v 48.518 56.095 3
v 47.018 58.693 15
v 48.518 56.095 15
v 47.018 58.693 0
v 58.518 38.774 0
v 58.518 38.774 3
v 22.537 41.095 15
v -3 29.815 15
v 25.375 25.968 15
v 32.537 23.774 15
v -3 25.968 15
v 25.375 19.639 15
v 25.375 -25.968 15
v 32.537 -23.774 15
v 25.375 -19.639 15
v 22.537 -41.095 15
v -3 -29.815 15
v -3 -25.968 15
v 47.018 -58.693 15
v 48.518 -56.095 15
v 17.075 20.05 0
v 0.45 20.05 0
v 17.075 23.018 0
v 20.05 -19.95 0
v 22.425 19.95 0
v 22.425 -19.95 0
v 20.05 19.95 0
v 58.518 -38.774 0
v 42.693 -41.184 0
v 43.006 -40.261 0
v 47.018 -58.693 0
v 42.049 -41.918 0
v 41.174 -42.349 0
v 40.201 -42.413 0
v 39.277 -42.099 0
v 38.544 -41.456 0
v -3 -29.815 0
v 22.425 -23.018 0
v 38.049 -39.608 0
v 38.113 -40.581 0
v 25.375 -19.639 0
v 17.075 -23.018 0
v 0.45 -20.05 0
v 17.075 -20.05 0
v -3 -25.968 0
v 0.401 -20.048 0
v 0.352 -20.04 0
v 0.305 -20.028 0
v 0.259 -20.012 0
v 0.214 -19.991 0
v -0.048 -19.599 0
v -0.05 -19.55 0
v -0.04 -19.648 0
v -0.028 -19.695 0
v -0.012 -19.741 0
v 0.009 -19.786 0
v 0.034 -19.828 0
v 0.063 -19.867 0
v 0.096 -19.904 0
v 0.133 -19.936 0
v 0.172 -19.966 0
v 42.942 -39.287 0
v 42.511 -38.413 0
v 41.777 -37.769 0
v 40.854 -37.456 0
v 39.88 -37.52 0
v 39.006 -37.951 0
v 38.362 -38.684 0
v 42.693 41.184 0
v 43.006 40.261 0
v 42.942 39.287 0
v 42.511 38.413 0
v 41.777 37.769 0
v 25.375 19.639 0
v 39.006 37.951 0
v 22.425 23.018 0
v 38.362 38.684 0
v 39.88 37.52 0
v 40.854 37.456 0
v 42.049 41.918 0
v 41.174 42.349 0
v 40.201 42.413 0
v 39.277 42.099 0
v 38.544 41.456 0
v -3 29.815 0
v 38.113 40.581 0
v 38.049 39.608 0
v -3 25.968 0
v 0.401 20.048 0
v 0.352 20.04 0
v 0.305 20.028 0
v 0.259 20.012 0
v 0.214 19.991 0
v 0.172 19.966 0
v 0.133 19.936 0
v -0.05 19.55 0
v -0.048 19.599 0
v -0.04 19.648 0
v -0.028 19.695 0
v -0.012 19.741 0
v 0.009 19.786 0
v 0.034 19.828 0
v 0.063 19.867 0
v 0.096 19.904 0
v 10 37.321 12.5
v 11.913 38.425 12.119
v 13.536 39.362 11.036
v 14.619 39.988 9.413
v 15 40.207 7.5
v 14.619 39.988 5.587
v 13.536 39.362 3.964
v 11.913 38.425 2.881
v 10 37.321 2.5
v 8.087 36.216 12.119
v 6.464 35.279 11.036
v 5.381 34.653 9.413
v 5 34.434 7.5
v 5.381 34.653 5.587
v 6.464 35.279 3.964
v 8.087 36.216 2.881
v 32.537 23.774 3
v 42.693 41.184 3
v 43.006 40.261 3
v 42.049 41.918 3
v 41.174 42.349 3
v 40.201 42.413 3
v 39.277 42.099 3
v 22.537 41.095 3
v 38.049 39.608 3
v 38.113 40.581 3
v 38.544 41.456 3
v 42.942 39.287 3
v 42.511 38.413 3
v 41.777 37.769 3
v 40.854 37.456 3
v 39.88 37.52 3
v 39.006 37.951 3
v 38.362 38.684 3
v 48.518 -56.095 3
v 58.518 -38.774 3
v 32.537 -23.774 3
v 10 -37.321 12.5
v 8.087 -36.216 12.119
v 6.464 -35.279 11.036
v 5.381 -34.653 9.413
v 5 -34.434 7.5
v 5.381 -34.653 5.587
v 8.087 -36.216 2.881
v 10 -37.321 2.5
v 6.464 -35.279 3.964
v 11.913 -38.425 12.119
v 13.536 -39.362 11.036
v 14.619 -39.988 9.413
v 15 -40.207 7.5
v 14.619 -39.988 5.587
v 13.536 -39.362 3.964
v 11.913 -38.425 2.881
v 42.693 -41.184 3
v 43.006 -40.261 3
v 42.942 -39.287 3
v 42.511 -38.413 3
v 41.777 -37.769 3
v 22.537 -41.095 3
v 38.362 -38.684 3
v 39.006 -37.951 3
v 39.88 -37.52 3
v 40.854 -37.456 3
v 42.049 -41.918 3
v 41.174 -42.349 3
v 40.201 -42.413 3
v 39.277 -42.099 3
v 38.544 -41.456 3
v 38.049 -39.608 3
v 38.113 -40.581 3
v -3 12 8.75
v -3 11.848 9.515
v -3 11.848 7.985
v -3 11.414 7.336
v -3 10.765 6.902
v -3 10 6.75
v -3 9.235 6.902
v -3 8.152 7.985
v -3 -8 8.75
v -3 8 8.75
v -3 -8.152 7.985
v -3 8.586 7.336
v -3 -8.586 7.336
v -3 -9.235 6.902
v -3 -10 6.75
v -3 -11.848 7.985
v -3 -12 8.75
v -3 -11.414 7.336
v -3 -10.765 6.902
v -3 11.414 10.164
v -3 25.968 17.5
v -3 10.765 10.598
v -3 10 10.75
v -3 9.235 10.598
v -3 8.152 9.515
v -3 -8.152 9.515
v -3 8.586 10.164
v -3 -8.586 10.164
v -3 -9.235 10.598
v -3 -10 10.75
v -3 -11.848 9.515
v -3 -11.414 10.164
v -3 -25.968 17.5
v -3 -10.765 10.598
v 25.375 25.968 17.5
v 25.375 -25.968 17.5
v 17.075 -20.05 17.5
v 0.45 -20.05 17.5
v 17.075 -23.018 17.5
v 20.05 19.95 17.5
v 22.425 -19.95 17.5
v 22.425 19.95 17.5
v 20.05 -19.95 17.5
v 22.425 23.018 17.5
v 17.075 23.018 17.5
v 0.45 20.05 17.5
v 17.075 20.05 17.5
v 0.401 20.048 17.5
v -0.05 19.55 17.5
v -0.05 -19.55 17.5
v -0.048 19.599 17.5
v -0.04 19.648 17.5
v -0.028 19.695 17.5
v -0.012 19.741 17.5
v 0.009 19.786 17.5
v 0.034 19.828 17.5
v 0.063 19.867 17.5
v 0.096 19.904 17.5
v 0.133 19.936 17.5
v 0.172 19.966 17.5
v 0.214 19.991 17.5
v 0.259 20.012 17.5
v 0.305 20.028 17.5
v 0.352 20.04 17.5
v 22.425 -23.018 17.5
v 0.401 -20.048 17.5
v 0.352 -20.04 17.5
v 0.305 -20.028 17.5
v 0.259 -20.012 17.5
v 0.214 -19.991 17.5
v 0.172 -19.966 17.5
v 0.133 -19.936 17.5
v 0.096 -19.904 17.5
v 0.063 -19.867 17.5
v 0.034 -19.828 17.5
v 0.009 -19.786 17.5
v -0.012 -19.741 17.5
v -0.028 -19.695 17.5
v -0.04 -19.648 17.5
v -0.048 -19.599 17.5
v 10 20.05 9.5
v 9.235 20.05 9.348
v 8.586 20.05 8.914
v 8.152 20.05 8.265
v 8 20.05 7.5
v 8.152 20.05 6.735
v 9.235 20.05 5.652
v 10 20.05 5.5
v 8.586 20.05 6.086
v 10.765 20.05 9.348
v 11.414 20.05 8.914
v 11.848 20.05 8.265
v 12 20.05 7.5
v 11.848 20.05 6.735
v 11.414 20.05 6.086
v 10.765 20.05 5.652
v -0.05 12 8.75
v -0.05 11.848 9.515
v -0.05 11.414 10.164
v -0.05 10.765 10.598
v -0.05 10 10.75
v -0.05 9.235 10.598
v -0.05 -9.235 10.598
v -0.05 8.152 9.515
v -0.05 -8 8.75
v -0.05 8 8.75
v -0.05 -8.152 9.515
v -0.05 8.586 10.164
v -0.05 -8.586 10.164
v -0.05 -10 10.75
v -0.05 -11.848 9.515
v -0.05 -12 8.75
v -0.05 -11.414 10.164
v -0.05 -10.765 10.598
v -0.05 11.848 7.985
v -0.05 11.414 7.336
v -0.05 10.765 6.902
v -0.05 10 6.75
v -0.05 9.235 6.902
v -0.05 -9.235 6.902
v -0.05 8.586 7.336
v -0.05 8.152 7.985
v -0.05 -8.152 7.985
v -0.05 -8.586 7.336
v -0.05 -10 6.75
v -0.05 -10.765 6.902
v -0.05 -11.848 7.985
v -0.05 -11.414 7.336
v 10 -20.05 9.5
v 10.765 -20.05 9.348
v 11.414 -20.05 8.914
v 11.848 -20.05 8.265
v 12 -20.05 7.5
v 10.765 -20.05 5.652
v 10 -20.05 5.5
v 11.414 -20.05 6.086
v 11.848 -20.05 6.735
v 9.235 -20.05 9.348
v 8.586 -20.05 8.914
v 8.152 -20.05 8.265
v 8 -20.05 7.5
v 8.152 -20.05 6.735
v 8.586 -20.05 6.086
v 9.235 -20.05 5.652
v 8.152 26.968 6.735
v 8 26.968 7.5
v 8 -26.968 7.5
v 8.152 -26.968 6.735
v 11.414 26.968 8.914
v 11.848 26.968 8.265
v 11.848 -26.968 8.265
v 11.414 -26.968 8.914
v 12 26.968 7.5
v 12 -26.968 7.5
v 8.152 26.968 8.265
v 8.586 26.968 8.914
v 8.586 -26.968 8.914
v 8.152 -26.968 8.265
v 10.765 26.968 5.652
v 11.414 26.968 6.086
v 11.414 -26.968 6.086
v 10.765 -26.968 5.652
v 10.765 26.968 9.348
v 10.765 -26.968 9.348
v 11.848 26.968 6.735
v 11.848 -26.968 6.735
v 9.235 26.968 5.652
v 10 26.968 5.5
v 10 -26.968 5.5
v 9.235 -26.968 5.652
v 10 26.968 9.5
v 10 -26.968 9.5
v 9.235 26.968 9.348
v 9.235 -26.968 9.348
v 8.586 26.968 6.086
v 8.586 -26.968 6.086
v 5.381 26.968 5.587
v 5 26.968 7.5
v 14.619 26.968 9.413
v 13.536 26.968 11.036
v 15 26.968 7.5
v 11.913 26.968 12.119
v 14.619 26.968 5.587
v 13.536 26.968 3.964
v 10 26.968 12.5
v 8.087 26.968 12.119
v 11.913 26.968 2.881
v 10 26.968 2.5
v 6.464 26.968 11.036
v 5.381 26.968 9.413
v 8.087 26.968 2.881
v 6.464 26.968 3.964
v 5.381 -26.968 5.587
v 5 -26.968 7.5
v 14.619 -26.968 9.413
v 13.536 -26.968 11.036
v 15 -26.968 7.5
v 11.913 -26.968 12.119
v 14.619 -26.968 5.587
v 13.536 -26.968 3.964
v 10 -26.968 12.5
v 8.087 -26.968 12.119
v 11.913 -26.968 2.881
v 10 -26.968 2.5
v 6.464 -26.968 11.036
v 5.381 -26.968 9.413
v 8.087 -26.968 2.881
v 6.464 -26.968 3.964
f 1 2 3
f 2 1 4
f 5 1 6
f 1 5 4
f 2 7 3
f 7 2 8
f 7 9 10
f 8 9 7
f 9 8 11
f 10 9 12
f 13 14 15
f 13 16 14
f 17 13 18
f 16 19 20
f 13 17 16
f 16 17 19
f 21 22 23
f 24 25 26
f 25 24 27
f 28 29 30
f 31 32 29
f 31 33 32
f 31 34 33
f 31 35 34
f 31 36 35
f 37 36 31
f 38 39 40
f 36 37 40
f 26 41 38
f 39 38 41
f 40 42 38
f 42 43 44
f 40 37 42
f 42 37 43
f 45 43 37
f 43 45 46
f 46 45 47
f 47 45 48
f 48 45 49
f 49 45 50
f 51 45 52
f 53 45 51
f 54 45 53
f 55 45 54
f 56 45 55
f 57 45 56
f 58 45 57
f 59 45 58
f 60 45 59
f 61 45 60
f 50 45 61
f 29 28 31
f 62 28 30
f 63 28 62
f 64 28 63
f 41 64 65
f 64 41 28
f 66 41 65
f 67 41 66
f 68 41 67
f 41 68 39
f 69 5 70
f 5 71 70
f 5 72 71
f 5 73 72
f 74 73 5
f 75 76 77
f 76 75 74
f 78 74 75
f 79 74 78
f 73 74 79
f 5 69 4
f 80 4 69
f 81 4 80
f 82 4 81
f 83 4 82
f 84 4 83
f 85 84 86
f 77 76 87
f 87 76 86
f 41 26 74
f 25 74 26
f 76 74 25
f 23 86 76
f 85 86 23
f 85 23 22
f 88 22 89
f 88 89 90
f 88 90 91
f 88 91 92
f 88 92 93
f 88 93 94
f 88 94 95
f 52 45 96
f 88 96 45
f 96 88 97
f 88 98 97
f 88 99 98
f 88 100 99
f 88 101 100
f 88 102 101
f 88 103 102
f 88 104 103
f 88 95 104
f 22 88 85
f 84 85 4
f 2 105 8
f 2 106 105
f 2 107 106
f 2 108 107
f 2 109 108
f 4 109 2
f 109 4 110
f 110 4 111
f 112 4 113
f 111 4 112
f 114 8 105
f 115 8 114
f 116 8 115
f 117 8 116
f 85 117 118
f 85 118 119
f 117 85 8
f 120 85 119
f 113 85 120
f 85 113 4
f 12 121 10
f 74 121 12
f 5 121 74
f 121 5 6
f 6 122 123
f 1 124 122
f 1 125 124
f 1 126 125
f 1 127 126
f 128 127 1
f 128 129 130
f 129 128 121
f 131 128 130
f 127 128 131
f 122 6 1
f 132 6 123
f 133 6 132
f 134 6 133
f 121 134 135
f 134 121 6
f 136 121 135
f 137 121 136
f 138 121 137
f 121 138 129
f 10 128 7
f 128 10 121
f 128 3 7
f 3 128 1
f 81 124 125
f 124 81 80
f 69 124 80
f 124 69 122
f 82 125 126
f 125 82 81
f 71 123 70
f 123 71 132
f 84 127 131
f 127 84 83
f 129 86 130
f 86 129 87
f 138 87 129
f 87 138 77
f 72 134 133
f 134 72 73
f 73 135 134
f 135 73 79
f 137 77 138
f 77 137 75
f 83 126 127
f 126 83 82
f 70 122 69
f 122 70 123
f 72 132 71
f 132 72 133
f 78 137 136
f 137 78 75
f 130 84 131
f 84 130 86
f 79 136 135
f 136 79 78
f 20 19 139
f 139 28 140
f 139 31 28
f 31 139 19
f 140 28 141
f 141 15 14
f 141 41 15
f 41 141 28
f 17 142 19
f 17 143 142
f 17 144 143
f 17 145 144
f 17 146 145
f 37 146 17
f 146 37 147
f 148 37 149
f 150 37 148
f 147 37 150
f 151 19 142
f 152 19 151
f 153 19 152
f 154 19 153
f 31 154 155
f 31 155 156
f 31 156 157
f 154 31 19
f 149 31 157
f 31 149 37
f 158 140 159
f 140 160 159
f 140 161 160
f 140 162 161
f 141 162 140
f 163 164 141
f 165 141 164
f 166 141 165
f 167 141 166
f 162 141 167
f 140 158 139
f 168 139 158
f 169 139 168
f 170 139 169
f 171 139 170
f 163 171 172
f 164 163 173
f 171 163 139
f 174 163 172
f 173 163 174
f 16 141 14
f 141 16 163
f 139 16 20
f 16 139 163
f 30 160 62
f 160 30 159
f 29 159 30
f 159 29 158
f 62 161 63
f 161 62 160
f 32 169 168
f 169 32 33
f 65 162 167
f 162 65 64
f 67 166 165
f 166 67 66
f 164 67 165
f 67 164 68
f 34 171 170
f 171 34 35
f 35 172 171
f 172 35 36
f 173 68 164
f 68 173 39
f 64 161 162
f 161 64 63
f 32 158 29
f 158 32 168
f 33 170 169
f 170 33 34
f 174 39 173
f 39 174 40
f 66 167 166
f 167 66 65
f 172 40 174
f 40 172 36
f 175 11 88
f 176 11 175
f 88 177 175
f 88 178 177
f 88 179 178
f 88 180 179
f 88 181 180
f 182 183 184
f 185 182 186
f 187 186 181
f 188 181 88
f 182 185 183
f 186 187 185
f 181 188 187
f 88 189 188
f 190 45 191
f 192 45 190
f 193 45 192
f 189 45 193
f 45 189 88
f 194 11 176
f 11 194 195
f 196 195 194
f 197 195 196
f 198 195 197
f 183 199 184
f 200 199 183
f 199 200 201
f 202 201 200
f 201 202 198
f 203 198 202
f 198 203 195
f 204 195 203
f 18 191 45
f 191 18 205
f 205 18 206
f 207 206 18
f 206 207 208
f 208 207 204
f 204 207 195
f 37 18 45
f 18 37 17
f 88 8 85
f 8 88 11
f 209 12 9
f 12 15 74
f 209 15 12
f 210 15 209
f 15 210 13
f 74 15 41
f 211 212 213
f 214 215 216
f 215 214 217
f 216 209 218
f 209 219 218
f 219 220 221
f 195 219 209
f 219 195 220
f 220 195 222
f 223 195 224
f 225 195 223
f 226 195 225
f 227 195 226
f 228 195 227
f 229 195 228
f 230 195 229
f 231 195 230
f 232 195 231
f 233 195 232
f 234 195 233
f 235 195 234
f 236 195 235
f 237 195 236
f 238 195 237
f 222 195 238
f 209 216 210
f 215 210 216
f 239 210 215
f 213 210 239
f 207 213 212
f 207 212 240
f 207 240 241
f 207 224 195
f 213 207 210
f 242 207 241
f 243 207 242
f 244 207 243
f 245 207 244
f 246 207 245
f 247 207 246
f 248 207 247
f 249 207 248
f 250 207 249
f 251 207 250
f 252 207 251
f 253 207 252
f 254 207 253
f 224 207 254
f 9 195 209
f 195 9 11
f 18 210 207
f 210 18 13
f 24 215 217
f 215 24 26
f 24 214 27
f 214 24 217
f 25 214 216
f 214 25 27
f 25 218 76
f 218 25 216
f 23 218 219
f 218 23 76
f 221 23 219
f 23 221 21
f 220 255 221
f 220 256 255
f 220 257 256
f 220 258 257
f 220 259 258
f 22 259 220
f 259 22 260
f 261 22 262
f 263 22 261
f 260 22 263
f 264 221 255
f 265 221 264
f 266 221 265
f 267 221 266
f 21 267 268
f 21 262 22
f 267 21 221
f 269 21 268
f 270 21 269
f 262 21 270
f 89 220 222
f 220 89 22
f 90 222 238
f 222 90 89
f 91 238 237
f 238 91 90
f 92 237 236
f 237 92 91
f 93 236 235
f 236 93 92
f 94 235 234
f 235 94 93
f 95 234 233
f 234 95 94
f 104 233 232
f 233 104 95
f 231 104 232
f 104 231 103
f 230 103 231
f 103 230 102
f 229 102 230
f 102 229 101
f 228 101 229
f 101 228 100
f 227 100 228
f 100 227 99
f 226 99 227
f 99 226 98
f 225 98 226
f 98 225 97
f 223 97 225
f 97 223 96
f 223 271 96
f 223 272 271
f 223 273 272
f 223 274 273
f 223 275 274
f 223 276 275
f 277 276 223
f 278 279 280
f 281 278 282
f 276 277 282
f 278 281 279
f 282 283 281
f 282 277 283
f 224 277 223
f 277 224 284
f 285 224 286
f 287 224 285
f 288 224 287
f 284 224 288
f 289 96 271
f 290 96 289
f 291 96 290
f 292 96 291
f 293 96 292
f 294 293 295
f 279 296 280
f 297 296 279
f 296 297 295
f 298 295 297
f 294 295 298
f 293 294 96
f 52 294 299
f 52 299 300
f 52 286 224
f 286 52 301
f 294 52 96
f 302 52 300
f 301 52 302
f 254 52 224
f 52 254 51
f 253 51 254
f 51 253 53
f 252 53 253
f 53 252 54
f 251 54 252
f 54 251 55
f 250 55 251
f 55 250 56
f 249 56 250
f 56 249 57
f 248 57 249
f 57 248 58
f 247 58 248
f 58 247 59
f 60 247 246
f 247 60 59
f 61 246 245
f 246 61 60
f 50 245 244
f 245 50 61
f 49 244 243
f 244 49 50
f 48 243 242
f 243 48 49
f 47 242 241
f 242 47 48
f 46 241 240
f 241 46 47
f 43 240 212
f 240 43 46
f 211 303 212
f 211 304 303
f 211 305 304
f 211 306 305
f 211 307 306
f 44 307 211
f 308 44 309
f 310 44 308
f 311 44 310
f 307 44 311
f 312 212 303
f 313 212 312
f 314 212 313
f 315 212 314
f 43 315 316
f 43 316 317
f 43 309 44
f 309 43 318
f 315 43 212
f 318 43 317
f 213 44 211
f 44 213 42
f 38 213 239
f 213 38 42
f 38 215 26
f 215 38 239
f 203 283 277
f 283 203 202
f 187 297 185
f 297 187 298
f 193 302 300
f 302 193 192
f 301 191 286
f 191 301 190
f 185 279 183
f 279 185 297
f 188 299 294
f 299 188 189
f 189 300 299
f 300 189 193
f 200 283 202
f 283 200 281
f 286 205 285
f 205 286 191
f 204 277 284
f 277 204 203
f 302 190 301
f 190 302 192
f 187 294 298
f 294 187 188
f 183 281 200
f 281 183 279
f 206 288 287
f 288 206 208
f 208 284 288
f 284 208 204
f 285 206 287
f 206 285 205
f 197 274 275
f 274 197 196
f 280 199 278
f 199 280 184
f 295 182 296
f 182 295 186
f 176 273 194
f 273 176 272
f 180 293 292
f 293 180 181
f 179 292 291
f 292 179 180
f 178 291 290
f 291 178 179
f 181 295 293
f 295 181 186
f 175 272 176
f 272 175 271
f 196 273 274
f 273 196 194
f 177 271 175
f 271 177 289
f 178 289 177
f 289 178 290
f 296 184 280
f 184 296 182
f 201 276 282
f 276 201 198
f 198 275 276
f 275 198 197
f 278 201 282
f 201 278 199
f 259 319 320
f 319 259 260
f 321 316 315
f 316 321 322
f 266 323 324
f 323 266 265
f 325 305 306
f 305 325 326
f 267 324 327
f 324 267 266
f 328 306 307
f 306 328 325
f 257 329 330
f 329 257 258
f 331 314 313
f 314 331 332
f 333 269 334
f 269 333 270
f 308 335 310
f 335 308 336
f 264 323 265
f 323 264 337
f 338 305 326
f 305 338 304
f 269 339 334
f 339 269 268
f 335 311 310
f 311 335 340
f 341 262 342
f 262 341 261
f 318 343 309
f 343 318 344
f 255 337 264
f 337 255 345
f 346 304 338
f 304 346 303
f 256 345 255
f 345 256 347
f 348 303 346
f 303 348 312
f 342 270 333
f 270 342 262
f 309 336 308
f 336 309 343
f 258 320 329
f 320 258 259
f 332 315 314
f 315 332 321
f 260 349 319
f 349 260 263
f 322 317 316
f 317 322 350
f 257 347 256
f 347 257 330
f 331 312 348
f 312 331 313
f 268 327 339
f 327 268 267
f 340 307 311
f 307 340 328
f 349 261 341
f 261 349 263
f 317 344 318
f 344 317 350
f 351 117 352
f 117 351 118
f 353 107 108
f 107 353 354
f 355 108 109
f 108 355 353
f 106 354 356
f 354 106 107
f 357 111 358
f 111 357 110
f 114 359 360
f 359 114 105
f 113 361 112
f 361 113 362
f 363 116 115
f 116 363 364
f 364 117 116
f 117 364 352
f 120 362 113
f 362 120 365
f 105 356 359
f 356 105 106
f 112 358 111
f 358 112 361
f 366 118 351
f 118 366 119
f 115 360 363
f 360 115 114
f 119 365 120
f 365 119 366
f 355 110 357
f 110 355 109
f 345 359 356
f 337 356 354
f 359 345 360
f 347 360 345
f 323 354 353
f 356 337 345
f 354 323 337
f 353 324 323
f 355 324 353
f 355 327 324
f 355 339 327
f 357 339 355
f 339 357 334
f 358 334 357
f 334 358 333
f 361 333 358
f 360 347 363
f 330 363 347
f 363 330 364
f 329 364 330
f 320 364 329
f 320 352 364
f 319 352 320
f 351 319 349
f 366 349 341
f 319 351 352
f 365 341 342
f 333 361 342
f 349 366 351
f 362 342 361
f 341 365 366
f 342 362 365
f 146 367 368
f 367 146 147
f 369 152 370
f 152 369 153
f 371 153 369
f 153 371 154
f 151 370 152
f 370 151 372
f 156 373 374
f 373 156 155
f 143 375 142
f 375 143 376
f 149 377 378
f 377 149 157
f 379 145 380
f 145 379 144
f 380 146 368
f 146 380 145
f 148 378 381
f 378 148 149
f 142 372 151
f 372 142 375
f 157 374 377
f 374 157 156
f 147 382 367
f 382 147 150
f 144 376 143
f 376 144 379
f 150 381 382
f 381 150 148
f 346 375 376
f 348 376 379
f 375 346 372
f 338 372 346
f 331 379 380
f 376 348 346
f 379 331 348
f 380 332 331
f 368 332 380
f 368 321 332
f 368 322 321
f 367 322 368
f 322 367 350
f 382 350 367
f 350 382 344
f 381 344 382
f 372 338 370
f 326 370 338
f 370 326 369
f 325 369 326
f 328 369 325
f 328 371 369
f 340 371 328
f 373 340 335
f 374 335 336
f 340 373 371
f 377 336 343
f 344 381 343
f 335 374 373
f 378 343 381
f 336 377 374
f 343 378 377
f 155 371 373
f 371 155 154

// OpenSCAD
// file: ../../conf/printer_config.scad
/**********************************************************************************************************************
 **
 ** conf/printer_config.scad
 **
 ** This file contains the main control variables that determine the size and shape of the printer. Note that in the
 ** actual parts specifications, the constants defined here will only ever be accessed through functions defined in
 ** conf/derived_sizes.scad exclusively to allow for easier adaptation, should the mode of calculation change. 
 **
 ** All sizes in mm. Caution: Little to no cross-checking is implemented. Change values sensibly and one at a time.
 **
 ** This file is NOT to be included by any other file except for conf/derived_sizes.scad.
 **
 **********************************************************************************************************************/

include <constants.scad>

// ===== PRINTER CONFIGURATION ========================================================================================

// The length of the vertical MakerSlide extrusions that make up the rails for the carriages.
FRAME_V_RAIL_HEIGHT = 800;

// The length of the horizontal 20x20 V-Slot extrusions that form the sides of the triangle.
FRAME_H_RAIL_LENGTH = 400;

// ===== FABRICATED PART DIMENSIONS ===================================================================================

// The additional clearance to leave around the MakerSlide extrusion.
MAKERSLIDE_CLEARANCE = 0.05;

// The thickness of the walls outside the extruded parts.
FRAME_PART_WALL_THICKNESS = 3;

// The thickness of the wall that separates the vertical rails from the horizontal extrusions.
FRAME_V_H_RAIL_SEPARATION = 8;

// The depth of the holes that hold the V-Slot extrusions.
FRAME_PART_VSLOT_DEPTH = 30;

// Whether to use a horizontal rail at the base of the printer or not.
FRAME_HORIZONTAL_BASE_RAIL = false;

// The depth of the holes in the foot that hold the MakerSlide extrusions. This is for the foot version that holds
// a horizontal rail.
FRAME_FOOT_RAIL_MAKERSLIDE_DEPTH = 25; 

// The depth of the holes in the foot that hold the MakerSlide extrusions. This is for the foot version that does not
// hold a horizontal rail.
FRAME_FOOT_NORAIL_MAKERSLIDE_DEPTH = 17.5; 

// The size of the screws that can be used to mount the foot to the underlying surface.
FRAME_FOOT_BOTTOM_SCREW_SIZE = M5;

// The height of the bracket that holds the motor. WARNING: Increasing this might make it difficult to 
// turn the screws that hold the motor.
FRAME_MOTOR_BRACKET_HEIGHT = 25;

// The height of the bracket that holds the intermediate level with the working surface (print bed).
FRAME_BED_BRACKET_HEIGHT = 25; 

// The depth of the holes in the head that hold the MakerSlide extrusions.
FRAME_HEAD_MAKERSLIDE_DEPTH = 35; 

// The thickness of the carriage base plate. A thicker plate will make the carriage stiffer, but cost more
// material to print and take away space from the working area.
CARRIAGE_PLATE_THICKNESS = 6;

// The width of the border around the holes in the carriage base plate that hold the V-Wheels. 
CARRIAGE_PLATE_BORDER_WIDTH = 8;

// The range by which the vertical belt tensioner can be adjusted.
TENSIONER_RANGE = 15;

// The distance between the rods that hold the effector.
ROD_DISTANCE = 65;

// The outer diameter of the rods.
ROD_OUTER_DIAMETER = 6;

// The inner diameter of the rods. Set to 0 if the rods are not hollow.
ROD_INNER_DIAMETER = 4;

// The additional clearance to leave between the rod and the holder.
ROD_CLEARANCE = 0.05;

// The thickness of the outer wall around the rod.
ROD_HOLDER_WALL_THICKNESS = 2;

// The depth of the insets that hold the rods.
ROD_HOLDER_DEPTH = 10;

// The minimum angle of the arms.
ROD_MIN_ANGLE = 20;

// The factor used to round up the rod length.
ROD_ROUND_UP_TO = 5;

// The thickness of the magnet holder arms.
MAGNET_HOLDER_THICKNESS = 5;

// The additional clearance to leave around the magnet holder pin.
MAGNET_CLEARANCE = 0.025;

// The upward angle of the ball holder on the carriage.
CARRIAGE_BALL_HOLDER_ANGLE = 10;

// The additional distance between the magnets on the effector (not the rod distance - the other one :-)).
// This value is added to the minimum distance determined by the magnet size and wall thickness.
EFFECTOR_BALL_ADDITIONAL_DISTANCE = 15;

// The thickness of the effector plate.
EFFECTOR_THICKNESS = 8;
// file: ../../conf/constants.scad
/**********************************************************************************************************************
 **
 ** conf/constants.scad
 **
 ** This file contains constants and aliases used for the part size definitions.
 **
 **********************************************************************************************************************/

/**
 * The alias names for the rails.
 * A is the "front left" rail, B the "front right" rail, C the back rail.
 * These constants are also used for the sides of the frame and the effector; in this case, side A is the one 
 * opposing rail A.
 */
A = 0;
B = 1;
C = 2;

/**
 * Aliases for metric screw/nut sizes.
 */
M2 = 2;
M3 = 3;
M4 = 4;
M5 = 5;

/** 
 * Aliases for NEMA stepper motors.
 */
NEMA14 = 14;
NEMA17 = 17;
NEMA23 = 23;
// file: ../extrusions/vslot_2020.scad
/**********************************************************************************************************************
 **
 ** parts/extrusions/vslot_2020.scad
 **
 ** This file ontains some general functions that provide the dimensions of the profile as well as the modules used 
 ** to import the rendered rails. 
 ** This file is intended to be included by other files down the line.
 **
 **********************************************************************************************************************/

include <../../conf/colors.scad>
include <../../conf/derived_sizes.scad>
include <../../conf/part_sizes.scad>

use <../../bom/bom.scad>

/**
 * Provides the pre-rendered horizontal side piece.
 * The extrusion will lie horizontally along the positive X axis and will extend into positve Y and Z.
 */
module vslot_2020_side() {
	bom_entry(section = "Aluminium Extrusions", description = "V-Slot Extrusion", size = str(horizontal_extrusion_length(), "x20x20 mm"));
	color_extrusion()
		import(file = "vslot_2020_side.stl"); 
}

/**
 * Create an object that resembles the outer shell of a V-Slot 20x20 mm extrusion. Usage is similar
 * to vslot_extrusion(length). This is handy to punch a hole into a printed part that will later
 * accomodate the V-Slot 20x20 mm extrusion.
 */
module vslot_2020_punch(length, rounded = false) {
	color_punch()
		linear_extrude(height = length, center = false, convexity = 10)
			if (rounded) {
				hull($fn = vslot_2020_edge_resolution()) {
					translate([vslot_2020_edge_radius(), vslot_2020_edge_radius(), 0])
						circle(r = vslot_2020_edge_radius());
					translate([vslot_2020_depth() - vslot_2020_edge_radius(), vslot_2020_edge_radius(), 0])
						circle(r = vslot_2020_edge_radius());
					translate([vslot_2020_edge_radius(), 18.5, 0])
						circle(r = vslot_2020_edge_radius());
					translate([vslot_2020_depth() - vslot_2020_edge_radius(), vslot_2020_width() - vslot_2020_edge_radius(), 0])
						circle(r = vslot_2020_edge_radius());
				}
			} else {
				square([vslot_2020_depth(), vslot_2020_width()]);
			}
}
// file: ../extrusions/makerslide.scad
/**********************************************************************************************************************
 **
 ** parts/extrusions/makerslide.scad
 **
 ** This file ontains some general functions that provide the dimensions of the profile as well as the modules used 
 ** to import the rendered rails. 
 ** This file is intended to be included by other files down the line.
 **
 **********************************************************************************************************************/

include <../../conf/colors.scad>
include <../../conf/derived_sizes.scad>
include <../../conf/part_sizes.scad>

use <../../bom/bom.scad>

/**
 * Provides the pre-rendered main vertical rail.
 * The extrusion will reach into positive X and Z space while being centered on the Y axis.
 */
module makerslide_vertical_rail() {
	bom_entry(section = "Aluminium Extrusions", 
		      description = "MakerSlide Extrusion", 
		      size = str(vertical_extrusion_length(), " mm"));
	color_extrusion()
		import(file = "makerslide_rail.stl"); 
}

/**
 * Create an object that resembles the outer shell of a MakerSlide extrusion. Usage is similar
 * to makerslide_vertical_rail(length). This is handy to punch a hole into a printed part that will later
 * accomodate the MakerSlide extrusion.
 */
module makerslide_punch(length) {
	color_punch()
		linear_extrude(height = length, center = false, convexity = 10)
			union() {
				hull() {
					// use two circles for the back sides
					_y_offset = makerslide_base_width()/2 - makerslide_edge_radius() + makerslide_clearance();
					translate([makerslide_edge_radius() - makerslide_clearance(), -_y_offset, 0])
						circle(r = makerslide_edge_radius(), $fn = makerslide_edge_resolution());
					translate([makerslide_edge_radius() - makerslide_clearance(), _y_offset, 0])
						circle(r = makerslide_edge_radius(), $fn = makerslide_edge_resolution());
					// use a rectangle to shape the front side
					translate([makerslide_base_depth() - 1 + makerslide_clearance(), 
						       -makerslide_base_width()/2 - makerslide_clearance(), 0])
						square([1, makerslide_base_width() + 2 * makerslide_clearance()]);
				}
				_rail_base_x = makerslide_base_depth() - makerslide_edge_radius() - 
				               makerslide_rail_depth() - makerslide_clearance();
				_rail_offset_y = makerslide_base_width()/2 - makerslide_clearance();
				_rail_punch_width = makerslide_rail_width() + 2 * makerslide_clearance();
				_rail_punch_depth = 2*makerslide_rail_depth() + makerslide_edge_radius() + 2 * makerslide_clearance();
				translate([_rail_base_x, -_rail_offset_y - _rail_punch_width, 0])
					square([_rail_punch_depth, _rail_punch_width]);
				translate([_rail_base_x, _rail_offset_y, 0])
					square([_rail_punch_depth, _rail_punch_width]);

				// previous version:
				// // use the profile itself as the basic shape
				// import(file = "makerslide.dxf"); 
				// // add a rectangle to fill the holes on the left/right (small) sides 
				// // as well as most of the inside of the profile
				// translate([2, -20, 0])
				// 	square([18, 40]);
				// // add a second rectangle to fill the gaps on the back (we want to keep the rounded edges)
				// translate([0, -18, 0])
				// 	square([2, 36]);
				
			}
}
// file: ../../bom/bom.scad
/**********************************************************************************************************************
 **
 ** bom/bom.scad
 **
 ** This file provides the functions to generate a basic bill of materials (BOM) from the model.
 **
 **********************************************************************************************************************/

/**
 * A recursive function to format the parent module hierarchy as a series of delimited sub-strings.
 * Example: "vertical_axis_assembly>_vertical_axis_assembly>makerslide_vertical_rail"
 */
function _bom_parent_list(level, delimiter = ">") = 
	(level < $parent_modules - 1) ? str(_bom_parent_list(level = level + 1), delimiter, parent_module(level)) : "";

module bom_entry(section = "", description = "", size = "", number = 1) {
	// Only perform any actions if WRITE_BOM is set. This is done through the command line - see Makefile.
	if (WRITE_BOM) {
		echo(str("BOM;", section, ";", description, ";", size, ";", number, ";", _bom_parent_list(level = 2)));
	}
}
// file: ../../conf/colors.scad
/**********************************************************************************************************************
 **
 ** conf/colors.scad
 **
 ** This file defines some modules to use symbolic colors throughout the entire project.
 **
 **********************************************************************************************************************/

/**
 * The color of the aluminium extrusions.
 */
module color_extrusion() {
	color("LightGrey")
		children();
} 

/**
 * The color of the "outer" printed frame elements.
 */
module color_printed_outer_frame() {
	color("RoyalBlue")
		children();
} 

/**
 * The color of the "inner" printed frame elements.
 */
module color_printed_inner_frame() {
	color("DodgerBlue")
		children();
} 

/**
 * The color of the printed carriages.
 */
module color_printed_carriage() {
	color("DodgerBlue")
		children();
} 

/**
 * The color of the printed tensioners and end switch brackets.
 */
module color_printed_head_parts() {
	color("PowderBlue")
		children();
} 

/**
 * The color of the magnet holders.
 */
module color_printed_magnet_holders() {
	color("RoyalBlue")
		children();
} 

/**
 * The color of the printed effectors.
 */
module color_printed_effector() {
	color("DodgerBlue")
		children();
} 

/**
 * The color of the stock hardware parts like nuts, bolts and screws.
 */
module color_hardware() {
	color("DarkSlateGray")
		children();
} 

/**
 * The color of the magnets and steel balls.
 */
module color_magnets_balls() {
	color("Silver")
		children();
} 

/**
 * The color of the gears and ball bearings.
 */
module color_gears() {
	color("Gray")
		children();
} 

/**
 * The color of the belts.
 */
module color_belt() {
	color("SaddleBrown")
		children();
} 

/**
 * The color of the stepper motors.
 */
module color_motor() {
	color("DimGray")
		children();
} 

/**
 * The color of the end switches.
 */
module color_switch() {
	color([0.15, 0.15, 0.15])
		children();
} 

/**
 * The color of the V-Wheels.
 */
module color_vwheels() {
	color([0.075, 0.075, 0.075])
		children();
} 

/**
 * The color of the carbon fiber rods for the arms.
 */
module color_rod() {
	color([0.2, 0.2, 0.2])
		children();
} 

/**
 * The color of punches and other objects that are usually not intended to be rendered as such, but rather to be
 * used as subtractive objects.
 */
module color_punch() {
	color("Red")
		children();
} 
// main file
/**********************************************************************************************************************
 **
 ** parts/printed/foot_norail.scad
 **
 ** This file constructs the version of the foot of the printer frame that does not hold horizontal rail. To assemble 
 ** the printer, you need three of these parts.
 **
 **********************************************************************************************************************/

include <../../conf/colors.scad>
include <../../conf/derived_sizes.scad>
include <../../conf/part_sizes.scad>

use <../../bom/bom.scad>
use <../../parts/extrusions/makerslide.scad>
use <../../parts/extrusions/vslot_2020.scad>
use <../../parts/vitamins/vitamins.scad>

// The dimensions of the horizontal parts. Although this foot does not hold any extrusions here, the same dimensions
// are used to keep up the symmetry of the construction.
function _foot_norail_horizontal_height() = washer_diameter(M4) + 2 * frame_wall_thickness();
function _foot_norail_horizontal_width()  = vslot_2020_width() + frame_wall_thickness();
function _foot_norail_horizontal_depth()  = horizontal_extrusion_offset() + horizontal_recess_depth();
function _foot_norail_horizontal_left_y_offset() = -frame_wall_thickness() + horizontal_extrusion_outward_offset();
function _foot_norail_horizontal_right_y_offset() = -_foot_norail_horizontal_width() - horizontal_extrusion_outward_offset() + frame_wall_thickness();

// The dimensions of the vertical part that holds the MakerSlide extrusion.
function _foot_norail_vertical_height() = foot_norail_makerslide_recess_depth();
function _foot_norail_vertical_width()  = frame_wall_thickness() + makerslide_width() + frame_wall_thickness();
function _foot_norail_vertical_depth()  = frame_wall_thickness() + makerslide_depth() + frame_wall_thickness();
function _foot_norail_vertical_back_screw_height() = foot_norail_makerslide_recess_depth()/2;
function _foot_norail_vertical_side_screw_height() = _foot_norail_horizontal_height()/2; // align with other screw
function _foot_norail_vertical_side_screw_y_offset() = _foot_norail_vertical_width()/2 + 1;

/**
 * Auxiliary module that creates one of the vertical legs. Not to be used outside of this file.
 */
module _foot_norail_horizontal_leg(right = false) { 
	difference() {
		// the basic shape of the leg
		cube([_foot_norail_horizontal_depth(), _foot_norail_horizontal_width(), _foot_norail_horizontal_height()]);
		// minus the inner recess to save some material
		translate([horizontal_extrusion_offset(), right ? frame_wall_thickness() : 0, frame_wall_thickness()])
			cube([horizontal_recess_depth(), vslot_2020_width(), _foot_norail_horizontal_height()]);
		// minus the screw hole on the bottom side
		_screw_x = _foot_norail_horizontal_depth() - horizontal_screw_distance();
		translate([_screw_x, vslot_2020_depth()/2 + (right ? frame_wall_thickness() : 0), frame_wall_thickness()/2 + epsilon()])
				cylinder(d = foot_norail_bottom_screw_size(), h = frame_wall_thickness() + 2 * epsilon(), 
		                 center = true, $fn = frame_screw_hole_resolution());
	}
}

/**
 * Creates the lower foot assembly by rendering it from scratch. This module is not to be called externally, use 
 * foot() instead.
 */
module _render_foot_norail() {
	color_printed_outer_frame()
		render() {
			difference() {
				union() {
					// add a block to hold the MakerSlide extrusion, but without the holes for now
					translate([-frame_wall_thickness(), -_foot_norail_vertical_width()/2, 0])
						cube([_foot_norail_vertical_depth(), _foot_norail_vertical_width(), _foot_norail_vertical_height()]);
					// add blocks to hold the V-Slot extrusions, restricted to the specified wall depth in negative Y
					difference() {
						union() {
							rotate([0, 0, 30])
								translate([0, _foot_norail_horizontal_left_y_offset(), 0])
									_foot_norail_horizontal_leg(right = false);
							rotate([0, 0, -30])
								translate([0, _foot_norail_horizontal_right_y_offset(), 0])
									_foot_norail_horizontal_leg(right = true);
						}
						translate([-vslot_2020_depth()-frame_wall_thickness(), -makerslide_width(), 0])
							cube([vslot_2020_depth(), 2*makerslide_width(), _foot_norail_horizontal_height()]);
					}
				}
				// minus the hole for the MakerSlide extrusion
				makerslide_punch(foot_norail_makerslide_recess_depth());
				// minus the screw holes on the back
				translate([-frame_wall_thickness()/2, -makerslide_slot_offset(), _foot_norail_vertical_back_screw_height()])
					rotate([0, 90, 0])
						cylinder(d = frame_screw_size(), h = 2*frame_wall_thickness(), 
								 center = true, $fn = frame_screw_hole_resolution());
				translate([-frame_wall_thickness()/2, makerslide_slot_offset(), _foot_norail_vertical_back_screw_height()])
					rotate([0, 90, 0])
						cylinder(d = frame_screw_size(), h = 2*frame_wall_thickness(), 
								 center = true, $fn = frame_screw_hole_resolution());
				// minus the screw holes on the side
				translate([makerslide_slot_offset(), 0, _foot_norail_vertical_side_screw_height()])
					rotate([90, 0, 0])
						cylinder(d = frame_screw_size(), h = 2*_foot_norail_vertical_width(), 
								 center = true, $fn = frame_screw_hole_resolution());
				// minus an additional inset so that the side screws can rest on a perpendicular surface
				_inset_depth = 100;
				translate([makerslide_slot_offset(), _foot_norail_vertical_side_screw_y_offset() + _inset_depth/2, _foot_norail_vertical_side_screw_height()])
					rotate([90, 0, 0])
						cylinder(d = frame_screw_head_size(), h = _inset_depth, 
								 center = true, $fn = frame_screw_hole_resolution());
				translate([makerslide_slot_offset(), -_foot_norail_vertical_side_screw_y_offset() - _inset_depth/2, _foot_norail_vertical_side_screw_height()])
					rotate([90, 0, 0])
						cylinder(d = frame_screw_head_size(), h = _inset_depth, 
								 center = true, $fn = frame_screw_hole_resolution());				
			}
		} 
}

/**
 * Main module to use the pre-rendered lower foot. The assembly is centered on the Z axis in Y direction for easier 
 * manipulation, similar to the MakerSlide extrusion. 
 */
module foot_norail() {
	bom_entry(section = "Printed Parts", description = "Frame", size = "Foot (No-Rail Version)");
	color_printed_outer_frame()
		import(file = "foot_norail.stl");
}

/** 
 * Renders the hardware (nuts, bolts, screws) that are used to fixed the printed part to the surrounding parts.
 */
module foot_norail_hardware() {

	// vertical MakerSlide rail -- back 
	translate([-frame_wall_thickness() - epsilon() - washer_thickness(M4), 
		       -makerslide_slot_offset(), 
		       _foot_norail_vertical_back_screw_height()]) {
		washer(size = M4);
	}
	translate([-frame_wall_thickness() - epsilon() - washer_thickness(M4) - epsilon(), 
		       -makerslide_slot_offset(), 
		       _foot_norail_vertical_back_screw_height()]) {
		screw(size = M4, length = 8);
		nut_tslot(M4);
	}
	translate([-frame_wall_thickness() - epsilon() - washer_thickness(M4),
	           makerslide_slot_offset(), 
	           _foot_norail_vertical_back_screw_height()]) {
		washer(size = M4);
	}
	translate([-frame_wall_thickness() - epsilon() - washer_thickness(M4) - epsilon(),
	           makerslide_slot_offset(), 
	           _foot_norail_vertical_back_screw_height()]) {
		screw(size = M4, length = 8);
		nut_tslot(M4);
	}

	// vertical MakerSlide rail -- sides
	_side_screw_y = _foot_norail_vertical_side_screw_y_offset() + epsilon();
	translate([makerslide_slot_offset(), 
		       _side_screw_y + washer_thickness(M4), 
		       _foot_norail_vertical_side_screw_height()]) 
		rotate([0, 0, -90]) {
			washer(size = M4);
		}
	translate([makerslide_slot_offset(), 
		       _side_screw_y + washer_thickness(M4) + epsilon(), 
		       _foot_norail_vertical_side_screw_height()]) 
		rotate([0, 0, -90]) {
			screw(size = M4, length = 12);
			nut_tslot(M4);
		}
	translate([makerslide_slot_offset(), 
		       -_side_screw_y - washer_thickness(M4) - epsilon(), 
		       _foot_norail_vertical_side_screw_height()]) 
		rotate([0, 0, 90]) {
			screw(size = M4, length = 12);
			nut_tslot(M4);
		}
	translate([makerslide_slot_offset(), 
		       -_side_screw_y - washer_thickness(M4), 
		       _foot_norail_vertical_side_screw_height()]) 
		rotate([0, 0, 90]) {
			washer(size = M4);
		}

}

_render_foot_norail();
